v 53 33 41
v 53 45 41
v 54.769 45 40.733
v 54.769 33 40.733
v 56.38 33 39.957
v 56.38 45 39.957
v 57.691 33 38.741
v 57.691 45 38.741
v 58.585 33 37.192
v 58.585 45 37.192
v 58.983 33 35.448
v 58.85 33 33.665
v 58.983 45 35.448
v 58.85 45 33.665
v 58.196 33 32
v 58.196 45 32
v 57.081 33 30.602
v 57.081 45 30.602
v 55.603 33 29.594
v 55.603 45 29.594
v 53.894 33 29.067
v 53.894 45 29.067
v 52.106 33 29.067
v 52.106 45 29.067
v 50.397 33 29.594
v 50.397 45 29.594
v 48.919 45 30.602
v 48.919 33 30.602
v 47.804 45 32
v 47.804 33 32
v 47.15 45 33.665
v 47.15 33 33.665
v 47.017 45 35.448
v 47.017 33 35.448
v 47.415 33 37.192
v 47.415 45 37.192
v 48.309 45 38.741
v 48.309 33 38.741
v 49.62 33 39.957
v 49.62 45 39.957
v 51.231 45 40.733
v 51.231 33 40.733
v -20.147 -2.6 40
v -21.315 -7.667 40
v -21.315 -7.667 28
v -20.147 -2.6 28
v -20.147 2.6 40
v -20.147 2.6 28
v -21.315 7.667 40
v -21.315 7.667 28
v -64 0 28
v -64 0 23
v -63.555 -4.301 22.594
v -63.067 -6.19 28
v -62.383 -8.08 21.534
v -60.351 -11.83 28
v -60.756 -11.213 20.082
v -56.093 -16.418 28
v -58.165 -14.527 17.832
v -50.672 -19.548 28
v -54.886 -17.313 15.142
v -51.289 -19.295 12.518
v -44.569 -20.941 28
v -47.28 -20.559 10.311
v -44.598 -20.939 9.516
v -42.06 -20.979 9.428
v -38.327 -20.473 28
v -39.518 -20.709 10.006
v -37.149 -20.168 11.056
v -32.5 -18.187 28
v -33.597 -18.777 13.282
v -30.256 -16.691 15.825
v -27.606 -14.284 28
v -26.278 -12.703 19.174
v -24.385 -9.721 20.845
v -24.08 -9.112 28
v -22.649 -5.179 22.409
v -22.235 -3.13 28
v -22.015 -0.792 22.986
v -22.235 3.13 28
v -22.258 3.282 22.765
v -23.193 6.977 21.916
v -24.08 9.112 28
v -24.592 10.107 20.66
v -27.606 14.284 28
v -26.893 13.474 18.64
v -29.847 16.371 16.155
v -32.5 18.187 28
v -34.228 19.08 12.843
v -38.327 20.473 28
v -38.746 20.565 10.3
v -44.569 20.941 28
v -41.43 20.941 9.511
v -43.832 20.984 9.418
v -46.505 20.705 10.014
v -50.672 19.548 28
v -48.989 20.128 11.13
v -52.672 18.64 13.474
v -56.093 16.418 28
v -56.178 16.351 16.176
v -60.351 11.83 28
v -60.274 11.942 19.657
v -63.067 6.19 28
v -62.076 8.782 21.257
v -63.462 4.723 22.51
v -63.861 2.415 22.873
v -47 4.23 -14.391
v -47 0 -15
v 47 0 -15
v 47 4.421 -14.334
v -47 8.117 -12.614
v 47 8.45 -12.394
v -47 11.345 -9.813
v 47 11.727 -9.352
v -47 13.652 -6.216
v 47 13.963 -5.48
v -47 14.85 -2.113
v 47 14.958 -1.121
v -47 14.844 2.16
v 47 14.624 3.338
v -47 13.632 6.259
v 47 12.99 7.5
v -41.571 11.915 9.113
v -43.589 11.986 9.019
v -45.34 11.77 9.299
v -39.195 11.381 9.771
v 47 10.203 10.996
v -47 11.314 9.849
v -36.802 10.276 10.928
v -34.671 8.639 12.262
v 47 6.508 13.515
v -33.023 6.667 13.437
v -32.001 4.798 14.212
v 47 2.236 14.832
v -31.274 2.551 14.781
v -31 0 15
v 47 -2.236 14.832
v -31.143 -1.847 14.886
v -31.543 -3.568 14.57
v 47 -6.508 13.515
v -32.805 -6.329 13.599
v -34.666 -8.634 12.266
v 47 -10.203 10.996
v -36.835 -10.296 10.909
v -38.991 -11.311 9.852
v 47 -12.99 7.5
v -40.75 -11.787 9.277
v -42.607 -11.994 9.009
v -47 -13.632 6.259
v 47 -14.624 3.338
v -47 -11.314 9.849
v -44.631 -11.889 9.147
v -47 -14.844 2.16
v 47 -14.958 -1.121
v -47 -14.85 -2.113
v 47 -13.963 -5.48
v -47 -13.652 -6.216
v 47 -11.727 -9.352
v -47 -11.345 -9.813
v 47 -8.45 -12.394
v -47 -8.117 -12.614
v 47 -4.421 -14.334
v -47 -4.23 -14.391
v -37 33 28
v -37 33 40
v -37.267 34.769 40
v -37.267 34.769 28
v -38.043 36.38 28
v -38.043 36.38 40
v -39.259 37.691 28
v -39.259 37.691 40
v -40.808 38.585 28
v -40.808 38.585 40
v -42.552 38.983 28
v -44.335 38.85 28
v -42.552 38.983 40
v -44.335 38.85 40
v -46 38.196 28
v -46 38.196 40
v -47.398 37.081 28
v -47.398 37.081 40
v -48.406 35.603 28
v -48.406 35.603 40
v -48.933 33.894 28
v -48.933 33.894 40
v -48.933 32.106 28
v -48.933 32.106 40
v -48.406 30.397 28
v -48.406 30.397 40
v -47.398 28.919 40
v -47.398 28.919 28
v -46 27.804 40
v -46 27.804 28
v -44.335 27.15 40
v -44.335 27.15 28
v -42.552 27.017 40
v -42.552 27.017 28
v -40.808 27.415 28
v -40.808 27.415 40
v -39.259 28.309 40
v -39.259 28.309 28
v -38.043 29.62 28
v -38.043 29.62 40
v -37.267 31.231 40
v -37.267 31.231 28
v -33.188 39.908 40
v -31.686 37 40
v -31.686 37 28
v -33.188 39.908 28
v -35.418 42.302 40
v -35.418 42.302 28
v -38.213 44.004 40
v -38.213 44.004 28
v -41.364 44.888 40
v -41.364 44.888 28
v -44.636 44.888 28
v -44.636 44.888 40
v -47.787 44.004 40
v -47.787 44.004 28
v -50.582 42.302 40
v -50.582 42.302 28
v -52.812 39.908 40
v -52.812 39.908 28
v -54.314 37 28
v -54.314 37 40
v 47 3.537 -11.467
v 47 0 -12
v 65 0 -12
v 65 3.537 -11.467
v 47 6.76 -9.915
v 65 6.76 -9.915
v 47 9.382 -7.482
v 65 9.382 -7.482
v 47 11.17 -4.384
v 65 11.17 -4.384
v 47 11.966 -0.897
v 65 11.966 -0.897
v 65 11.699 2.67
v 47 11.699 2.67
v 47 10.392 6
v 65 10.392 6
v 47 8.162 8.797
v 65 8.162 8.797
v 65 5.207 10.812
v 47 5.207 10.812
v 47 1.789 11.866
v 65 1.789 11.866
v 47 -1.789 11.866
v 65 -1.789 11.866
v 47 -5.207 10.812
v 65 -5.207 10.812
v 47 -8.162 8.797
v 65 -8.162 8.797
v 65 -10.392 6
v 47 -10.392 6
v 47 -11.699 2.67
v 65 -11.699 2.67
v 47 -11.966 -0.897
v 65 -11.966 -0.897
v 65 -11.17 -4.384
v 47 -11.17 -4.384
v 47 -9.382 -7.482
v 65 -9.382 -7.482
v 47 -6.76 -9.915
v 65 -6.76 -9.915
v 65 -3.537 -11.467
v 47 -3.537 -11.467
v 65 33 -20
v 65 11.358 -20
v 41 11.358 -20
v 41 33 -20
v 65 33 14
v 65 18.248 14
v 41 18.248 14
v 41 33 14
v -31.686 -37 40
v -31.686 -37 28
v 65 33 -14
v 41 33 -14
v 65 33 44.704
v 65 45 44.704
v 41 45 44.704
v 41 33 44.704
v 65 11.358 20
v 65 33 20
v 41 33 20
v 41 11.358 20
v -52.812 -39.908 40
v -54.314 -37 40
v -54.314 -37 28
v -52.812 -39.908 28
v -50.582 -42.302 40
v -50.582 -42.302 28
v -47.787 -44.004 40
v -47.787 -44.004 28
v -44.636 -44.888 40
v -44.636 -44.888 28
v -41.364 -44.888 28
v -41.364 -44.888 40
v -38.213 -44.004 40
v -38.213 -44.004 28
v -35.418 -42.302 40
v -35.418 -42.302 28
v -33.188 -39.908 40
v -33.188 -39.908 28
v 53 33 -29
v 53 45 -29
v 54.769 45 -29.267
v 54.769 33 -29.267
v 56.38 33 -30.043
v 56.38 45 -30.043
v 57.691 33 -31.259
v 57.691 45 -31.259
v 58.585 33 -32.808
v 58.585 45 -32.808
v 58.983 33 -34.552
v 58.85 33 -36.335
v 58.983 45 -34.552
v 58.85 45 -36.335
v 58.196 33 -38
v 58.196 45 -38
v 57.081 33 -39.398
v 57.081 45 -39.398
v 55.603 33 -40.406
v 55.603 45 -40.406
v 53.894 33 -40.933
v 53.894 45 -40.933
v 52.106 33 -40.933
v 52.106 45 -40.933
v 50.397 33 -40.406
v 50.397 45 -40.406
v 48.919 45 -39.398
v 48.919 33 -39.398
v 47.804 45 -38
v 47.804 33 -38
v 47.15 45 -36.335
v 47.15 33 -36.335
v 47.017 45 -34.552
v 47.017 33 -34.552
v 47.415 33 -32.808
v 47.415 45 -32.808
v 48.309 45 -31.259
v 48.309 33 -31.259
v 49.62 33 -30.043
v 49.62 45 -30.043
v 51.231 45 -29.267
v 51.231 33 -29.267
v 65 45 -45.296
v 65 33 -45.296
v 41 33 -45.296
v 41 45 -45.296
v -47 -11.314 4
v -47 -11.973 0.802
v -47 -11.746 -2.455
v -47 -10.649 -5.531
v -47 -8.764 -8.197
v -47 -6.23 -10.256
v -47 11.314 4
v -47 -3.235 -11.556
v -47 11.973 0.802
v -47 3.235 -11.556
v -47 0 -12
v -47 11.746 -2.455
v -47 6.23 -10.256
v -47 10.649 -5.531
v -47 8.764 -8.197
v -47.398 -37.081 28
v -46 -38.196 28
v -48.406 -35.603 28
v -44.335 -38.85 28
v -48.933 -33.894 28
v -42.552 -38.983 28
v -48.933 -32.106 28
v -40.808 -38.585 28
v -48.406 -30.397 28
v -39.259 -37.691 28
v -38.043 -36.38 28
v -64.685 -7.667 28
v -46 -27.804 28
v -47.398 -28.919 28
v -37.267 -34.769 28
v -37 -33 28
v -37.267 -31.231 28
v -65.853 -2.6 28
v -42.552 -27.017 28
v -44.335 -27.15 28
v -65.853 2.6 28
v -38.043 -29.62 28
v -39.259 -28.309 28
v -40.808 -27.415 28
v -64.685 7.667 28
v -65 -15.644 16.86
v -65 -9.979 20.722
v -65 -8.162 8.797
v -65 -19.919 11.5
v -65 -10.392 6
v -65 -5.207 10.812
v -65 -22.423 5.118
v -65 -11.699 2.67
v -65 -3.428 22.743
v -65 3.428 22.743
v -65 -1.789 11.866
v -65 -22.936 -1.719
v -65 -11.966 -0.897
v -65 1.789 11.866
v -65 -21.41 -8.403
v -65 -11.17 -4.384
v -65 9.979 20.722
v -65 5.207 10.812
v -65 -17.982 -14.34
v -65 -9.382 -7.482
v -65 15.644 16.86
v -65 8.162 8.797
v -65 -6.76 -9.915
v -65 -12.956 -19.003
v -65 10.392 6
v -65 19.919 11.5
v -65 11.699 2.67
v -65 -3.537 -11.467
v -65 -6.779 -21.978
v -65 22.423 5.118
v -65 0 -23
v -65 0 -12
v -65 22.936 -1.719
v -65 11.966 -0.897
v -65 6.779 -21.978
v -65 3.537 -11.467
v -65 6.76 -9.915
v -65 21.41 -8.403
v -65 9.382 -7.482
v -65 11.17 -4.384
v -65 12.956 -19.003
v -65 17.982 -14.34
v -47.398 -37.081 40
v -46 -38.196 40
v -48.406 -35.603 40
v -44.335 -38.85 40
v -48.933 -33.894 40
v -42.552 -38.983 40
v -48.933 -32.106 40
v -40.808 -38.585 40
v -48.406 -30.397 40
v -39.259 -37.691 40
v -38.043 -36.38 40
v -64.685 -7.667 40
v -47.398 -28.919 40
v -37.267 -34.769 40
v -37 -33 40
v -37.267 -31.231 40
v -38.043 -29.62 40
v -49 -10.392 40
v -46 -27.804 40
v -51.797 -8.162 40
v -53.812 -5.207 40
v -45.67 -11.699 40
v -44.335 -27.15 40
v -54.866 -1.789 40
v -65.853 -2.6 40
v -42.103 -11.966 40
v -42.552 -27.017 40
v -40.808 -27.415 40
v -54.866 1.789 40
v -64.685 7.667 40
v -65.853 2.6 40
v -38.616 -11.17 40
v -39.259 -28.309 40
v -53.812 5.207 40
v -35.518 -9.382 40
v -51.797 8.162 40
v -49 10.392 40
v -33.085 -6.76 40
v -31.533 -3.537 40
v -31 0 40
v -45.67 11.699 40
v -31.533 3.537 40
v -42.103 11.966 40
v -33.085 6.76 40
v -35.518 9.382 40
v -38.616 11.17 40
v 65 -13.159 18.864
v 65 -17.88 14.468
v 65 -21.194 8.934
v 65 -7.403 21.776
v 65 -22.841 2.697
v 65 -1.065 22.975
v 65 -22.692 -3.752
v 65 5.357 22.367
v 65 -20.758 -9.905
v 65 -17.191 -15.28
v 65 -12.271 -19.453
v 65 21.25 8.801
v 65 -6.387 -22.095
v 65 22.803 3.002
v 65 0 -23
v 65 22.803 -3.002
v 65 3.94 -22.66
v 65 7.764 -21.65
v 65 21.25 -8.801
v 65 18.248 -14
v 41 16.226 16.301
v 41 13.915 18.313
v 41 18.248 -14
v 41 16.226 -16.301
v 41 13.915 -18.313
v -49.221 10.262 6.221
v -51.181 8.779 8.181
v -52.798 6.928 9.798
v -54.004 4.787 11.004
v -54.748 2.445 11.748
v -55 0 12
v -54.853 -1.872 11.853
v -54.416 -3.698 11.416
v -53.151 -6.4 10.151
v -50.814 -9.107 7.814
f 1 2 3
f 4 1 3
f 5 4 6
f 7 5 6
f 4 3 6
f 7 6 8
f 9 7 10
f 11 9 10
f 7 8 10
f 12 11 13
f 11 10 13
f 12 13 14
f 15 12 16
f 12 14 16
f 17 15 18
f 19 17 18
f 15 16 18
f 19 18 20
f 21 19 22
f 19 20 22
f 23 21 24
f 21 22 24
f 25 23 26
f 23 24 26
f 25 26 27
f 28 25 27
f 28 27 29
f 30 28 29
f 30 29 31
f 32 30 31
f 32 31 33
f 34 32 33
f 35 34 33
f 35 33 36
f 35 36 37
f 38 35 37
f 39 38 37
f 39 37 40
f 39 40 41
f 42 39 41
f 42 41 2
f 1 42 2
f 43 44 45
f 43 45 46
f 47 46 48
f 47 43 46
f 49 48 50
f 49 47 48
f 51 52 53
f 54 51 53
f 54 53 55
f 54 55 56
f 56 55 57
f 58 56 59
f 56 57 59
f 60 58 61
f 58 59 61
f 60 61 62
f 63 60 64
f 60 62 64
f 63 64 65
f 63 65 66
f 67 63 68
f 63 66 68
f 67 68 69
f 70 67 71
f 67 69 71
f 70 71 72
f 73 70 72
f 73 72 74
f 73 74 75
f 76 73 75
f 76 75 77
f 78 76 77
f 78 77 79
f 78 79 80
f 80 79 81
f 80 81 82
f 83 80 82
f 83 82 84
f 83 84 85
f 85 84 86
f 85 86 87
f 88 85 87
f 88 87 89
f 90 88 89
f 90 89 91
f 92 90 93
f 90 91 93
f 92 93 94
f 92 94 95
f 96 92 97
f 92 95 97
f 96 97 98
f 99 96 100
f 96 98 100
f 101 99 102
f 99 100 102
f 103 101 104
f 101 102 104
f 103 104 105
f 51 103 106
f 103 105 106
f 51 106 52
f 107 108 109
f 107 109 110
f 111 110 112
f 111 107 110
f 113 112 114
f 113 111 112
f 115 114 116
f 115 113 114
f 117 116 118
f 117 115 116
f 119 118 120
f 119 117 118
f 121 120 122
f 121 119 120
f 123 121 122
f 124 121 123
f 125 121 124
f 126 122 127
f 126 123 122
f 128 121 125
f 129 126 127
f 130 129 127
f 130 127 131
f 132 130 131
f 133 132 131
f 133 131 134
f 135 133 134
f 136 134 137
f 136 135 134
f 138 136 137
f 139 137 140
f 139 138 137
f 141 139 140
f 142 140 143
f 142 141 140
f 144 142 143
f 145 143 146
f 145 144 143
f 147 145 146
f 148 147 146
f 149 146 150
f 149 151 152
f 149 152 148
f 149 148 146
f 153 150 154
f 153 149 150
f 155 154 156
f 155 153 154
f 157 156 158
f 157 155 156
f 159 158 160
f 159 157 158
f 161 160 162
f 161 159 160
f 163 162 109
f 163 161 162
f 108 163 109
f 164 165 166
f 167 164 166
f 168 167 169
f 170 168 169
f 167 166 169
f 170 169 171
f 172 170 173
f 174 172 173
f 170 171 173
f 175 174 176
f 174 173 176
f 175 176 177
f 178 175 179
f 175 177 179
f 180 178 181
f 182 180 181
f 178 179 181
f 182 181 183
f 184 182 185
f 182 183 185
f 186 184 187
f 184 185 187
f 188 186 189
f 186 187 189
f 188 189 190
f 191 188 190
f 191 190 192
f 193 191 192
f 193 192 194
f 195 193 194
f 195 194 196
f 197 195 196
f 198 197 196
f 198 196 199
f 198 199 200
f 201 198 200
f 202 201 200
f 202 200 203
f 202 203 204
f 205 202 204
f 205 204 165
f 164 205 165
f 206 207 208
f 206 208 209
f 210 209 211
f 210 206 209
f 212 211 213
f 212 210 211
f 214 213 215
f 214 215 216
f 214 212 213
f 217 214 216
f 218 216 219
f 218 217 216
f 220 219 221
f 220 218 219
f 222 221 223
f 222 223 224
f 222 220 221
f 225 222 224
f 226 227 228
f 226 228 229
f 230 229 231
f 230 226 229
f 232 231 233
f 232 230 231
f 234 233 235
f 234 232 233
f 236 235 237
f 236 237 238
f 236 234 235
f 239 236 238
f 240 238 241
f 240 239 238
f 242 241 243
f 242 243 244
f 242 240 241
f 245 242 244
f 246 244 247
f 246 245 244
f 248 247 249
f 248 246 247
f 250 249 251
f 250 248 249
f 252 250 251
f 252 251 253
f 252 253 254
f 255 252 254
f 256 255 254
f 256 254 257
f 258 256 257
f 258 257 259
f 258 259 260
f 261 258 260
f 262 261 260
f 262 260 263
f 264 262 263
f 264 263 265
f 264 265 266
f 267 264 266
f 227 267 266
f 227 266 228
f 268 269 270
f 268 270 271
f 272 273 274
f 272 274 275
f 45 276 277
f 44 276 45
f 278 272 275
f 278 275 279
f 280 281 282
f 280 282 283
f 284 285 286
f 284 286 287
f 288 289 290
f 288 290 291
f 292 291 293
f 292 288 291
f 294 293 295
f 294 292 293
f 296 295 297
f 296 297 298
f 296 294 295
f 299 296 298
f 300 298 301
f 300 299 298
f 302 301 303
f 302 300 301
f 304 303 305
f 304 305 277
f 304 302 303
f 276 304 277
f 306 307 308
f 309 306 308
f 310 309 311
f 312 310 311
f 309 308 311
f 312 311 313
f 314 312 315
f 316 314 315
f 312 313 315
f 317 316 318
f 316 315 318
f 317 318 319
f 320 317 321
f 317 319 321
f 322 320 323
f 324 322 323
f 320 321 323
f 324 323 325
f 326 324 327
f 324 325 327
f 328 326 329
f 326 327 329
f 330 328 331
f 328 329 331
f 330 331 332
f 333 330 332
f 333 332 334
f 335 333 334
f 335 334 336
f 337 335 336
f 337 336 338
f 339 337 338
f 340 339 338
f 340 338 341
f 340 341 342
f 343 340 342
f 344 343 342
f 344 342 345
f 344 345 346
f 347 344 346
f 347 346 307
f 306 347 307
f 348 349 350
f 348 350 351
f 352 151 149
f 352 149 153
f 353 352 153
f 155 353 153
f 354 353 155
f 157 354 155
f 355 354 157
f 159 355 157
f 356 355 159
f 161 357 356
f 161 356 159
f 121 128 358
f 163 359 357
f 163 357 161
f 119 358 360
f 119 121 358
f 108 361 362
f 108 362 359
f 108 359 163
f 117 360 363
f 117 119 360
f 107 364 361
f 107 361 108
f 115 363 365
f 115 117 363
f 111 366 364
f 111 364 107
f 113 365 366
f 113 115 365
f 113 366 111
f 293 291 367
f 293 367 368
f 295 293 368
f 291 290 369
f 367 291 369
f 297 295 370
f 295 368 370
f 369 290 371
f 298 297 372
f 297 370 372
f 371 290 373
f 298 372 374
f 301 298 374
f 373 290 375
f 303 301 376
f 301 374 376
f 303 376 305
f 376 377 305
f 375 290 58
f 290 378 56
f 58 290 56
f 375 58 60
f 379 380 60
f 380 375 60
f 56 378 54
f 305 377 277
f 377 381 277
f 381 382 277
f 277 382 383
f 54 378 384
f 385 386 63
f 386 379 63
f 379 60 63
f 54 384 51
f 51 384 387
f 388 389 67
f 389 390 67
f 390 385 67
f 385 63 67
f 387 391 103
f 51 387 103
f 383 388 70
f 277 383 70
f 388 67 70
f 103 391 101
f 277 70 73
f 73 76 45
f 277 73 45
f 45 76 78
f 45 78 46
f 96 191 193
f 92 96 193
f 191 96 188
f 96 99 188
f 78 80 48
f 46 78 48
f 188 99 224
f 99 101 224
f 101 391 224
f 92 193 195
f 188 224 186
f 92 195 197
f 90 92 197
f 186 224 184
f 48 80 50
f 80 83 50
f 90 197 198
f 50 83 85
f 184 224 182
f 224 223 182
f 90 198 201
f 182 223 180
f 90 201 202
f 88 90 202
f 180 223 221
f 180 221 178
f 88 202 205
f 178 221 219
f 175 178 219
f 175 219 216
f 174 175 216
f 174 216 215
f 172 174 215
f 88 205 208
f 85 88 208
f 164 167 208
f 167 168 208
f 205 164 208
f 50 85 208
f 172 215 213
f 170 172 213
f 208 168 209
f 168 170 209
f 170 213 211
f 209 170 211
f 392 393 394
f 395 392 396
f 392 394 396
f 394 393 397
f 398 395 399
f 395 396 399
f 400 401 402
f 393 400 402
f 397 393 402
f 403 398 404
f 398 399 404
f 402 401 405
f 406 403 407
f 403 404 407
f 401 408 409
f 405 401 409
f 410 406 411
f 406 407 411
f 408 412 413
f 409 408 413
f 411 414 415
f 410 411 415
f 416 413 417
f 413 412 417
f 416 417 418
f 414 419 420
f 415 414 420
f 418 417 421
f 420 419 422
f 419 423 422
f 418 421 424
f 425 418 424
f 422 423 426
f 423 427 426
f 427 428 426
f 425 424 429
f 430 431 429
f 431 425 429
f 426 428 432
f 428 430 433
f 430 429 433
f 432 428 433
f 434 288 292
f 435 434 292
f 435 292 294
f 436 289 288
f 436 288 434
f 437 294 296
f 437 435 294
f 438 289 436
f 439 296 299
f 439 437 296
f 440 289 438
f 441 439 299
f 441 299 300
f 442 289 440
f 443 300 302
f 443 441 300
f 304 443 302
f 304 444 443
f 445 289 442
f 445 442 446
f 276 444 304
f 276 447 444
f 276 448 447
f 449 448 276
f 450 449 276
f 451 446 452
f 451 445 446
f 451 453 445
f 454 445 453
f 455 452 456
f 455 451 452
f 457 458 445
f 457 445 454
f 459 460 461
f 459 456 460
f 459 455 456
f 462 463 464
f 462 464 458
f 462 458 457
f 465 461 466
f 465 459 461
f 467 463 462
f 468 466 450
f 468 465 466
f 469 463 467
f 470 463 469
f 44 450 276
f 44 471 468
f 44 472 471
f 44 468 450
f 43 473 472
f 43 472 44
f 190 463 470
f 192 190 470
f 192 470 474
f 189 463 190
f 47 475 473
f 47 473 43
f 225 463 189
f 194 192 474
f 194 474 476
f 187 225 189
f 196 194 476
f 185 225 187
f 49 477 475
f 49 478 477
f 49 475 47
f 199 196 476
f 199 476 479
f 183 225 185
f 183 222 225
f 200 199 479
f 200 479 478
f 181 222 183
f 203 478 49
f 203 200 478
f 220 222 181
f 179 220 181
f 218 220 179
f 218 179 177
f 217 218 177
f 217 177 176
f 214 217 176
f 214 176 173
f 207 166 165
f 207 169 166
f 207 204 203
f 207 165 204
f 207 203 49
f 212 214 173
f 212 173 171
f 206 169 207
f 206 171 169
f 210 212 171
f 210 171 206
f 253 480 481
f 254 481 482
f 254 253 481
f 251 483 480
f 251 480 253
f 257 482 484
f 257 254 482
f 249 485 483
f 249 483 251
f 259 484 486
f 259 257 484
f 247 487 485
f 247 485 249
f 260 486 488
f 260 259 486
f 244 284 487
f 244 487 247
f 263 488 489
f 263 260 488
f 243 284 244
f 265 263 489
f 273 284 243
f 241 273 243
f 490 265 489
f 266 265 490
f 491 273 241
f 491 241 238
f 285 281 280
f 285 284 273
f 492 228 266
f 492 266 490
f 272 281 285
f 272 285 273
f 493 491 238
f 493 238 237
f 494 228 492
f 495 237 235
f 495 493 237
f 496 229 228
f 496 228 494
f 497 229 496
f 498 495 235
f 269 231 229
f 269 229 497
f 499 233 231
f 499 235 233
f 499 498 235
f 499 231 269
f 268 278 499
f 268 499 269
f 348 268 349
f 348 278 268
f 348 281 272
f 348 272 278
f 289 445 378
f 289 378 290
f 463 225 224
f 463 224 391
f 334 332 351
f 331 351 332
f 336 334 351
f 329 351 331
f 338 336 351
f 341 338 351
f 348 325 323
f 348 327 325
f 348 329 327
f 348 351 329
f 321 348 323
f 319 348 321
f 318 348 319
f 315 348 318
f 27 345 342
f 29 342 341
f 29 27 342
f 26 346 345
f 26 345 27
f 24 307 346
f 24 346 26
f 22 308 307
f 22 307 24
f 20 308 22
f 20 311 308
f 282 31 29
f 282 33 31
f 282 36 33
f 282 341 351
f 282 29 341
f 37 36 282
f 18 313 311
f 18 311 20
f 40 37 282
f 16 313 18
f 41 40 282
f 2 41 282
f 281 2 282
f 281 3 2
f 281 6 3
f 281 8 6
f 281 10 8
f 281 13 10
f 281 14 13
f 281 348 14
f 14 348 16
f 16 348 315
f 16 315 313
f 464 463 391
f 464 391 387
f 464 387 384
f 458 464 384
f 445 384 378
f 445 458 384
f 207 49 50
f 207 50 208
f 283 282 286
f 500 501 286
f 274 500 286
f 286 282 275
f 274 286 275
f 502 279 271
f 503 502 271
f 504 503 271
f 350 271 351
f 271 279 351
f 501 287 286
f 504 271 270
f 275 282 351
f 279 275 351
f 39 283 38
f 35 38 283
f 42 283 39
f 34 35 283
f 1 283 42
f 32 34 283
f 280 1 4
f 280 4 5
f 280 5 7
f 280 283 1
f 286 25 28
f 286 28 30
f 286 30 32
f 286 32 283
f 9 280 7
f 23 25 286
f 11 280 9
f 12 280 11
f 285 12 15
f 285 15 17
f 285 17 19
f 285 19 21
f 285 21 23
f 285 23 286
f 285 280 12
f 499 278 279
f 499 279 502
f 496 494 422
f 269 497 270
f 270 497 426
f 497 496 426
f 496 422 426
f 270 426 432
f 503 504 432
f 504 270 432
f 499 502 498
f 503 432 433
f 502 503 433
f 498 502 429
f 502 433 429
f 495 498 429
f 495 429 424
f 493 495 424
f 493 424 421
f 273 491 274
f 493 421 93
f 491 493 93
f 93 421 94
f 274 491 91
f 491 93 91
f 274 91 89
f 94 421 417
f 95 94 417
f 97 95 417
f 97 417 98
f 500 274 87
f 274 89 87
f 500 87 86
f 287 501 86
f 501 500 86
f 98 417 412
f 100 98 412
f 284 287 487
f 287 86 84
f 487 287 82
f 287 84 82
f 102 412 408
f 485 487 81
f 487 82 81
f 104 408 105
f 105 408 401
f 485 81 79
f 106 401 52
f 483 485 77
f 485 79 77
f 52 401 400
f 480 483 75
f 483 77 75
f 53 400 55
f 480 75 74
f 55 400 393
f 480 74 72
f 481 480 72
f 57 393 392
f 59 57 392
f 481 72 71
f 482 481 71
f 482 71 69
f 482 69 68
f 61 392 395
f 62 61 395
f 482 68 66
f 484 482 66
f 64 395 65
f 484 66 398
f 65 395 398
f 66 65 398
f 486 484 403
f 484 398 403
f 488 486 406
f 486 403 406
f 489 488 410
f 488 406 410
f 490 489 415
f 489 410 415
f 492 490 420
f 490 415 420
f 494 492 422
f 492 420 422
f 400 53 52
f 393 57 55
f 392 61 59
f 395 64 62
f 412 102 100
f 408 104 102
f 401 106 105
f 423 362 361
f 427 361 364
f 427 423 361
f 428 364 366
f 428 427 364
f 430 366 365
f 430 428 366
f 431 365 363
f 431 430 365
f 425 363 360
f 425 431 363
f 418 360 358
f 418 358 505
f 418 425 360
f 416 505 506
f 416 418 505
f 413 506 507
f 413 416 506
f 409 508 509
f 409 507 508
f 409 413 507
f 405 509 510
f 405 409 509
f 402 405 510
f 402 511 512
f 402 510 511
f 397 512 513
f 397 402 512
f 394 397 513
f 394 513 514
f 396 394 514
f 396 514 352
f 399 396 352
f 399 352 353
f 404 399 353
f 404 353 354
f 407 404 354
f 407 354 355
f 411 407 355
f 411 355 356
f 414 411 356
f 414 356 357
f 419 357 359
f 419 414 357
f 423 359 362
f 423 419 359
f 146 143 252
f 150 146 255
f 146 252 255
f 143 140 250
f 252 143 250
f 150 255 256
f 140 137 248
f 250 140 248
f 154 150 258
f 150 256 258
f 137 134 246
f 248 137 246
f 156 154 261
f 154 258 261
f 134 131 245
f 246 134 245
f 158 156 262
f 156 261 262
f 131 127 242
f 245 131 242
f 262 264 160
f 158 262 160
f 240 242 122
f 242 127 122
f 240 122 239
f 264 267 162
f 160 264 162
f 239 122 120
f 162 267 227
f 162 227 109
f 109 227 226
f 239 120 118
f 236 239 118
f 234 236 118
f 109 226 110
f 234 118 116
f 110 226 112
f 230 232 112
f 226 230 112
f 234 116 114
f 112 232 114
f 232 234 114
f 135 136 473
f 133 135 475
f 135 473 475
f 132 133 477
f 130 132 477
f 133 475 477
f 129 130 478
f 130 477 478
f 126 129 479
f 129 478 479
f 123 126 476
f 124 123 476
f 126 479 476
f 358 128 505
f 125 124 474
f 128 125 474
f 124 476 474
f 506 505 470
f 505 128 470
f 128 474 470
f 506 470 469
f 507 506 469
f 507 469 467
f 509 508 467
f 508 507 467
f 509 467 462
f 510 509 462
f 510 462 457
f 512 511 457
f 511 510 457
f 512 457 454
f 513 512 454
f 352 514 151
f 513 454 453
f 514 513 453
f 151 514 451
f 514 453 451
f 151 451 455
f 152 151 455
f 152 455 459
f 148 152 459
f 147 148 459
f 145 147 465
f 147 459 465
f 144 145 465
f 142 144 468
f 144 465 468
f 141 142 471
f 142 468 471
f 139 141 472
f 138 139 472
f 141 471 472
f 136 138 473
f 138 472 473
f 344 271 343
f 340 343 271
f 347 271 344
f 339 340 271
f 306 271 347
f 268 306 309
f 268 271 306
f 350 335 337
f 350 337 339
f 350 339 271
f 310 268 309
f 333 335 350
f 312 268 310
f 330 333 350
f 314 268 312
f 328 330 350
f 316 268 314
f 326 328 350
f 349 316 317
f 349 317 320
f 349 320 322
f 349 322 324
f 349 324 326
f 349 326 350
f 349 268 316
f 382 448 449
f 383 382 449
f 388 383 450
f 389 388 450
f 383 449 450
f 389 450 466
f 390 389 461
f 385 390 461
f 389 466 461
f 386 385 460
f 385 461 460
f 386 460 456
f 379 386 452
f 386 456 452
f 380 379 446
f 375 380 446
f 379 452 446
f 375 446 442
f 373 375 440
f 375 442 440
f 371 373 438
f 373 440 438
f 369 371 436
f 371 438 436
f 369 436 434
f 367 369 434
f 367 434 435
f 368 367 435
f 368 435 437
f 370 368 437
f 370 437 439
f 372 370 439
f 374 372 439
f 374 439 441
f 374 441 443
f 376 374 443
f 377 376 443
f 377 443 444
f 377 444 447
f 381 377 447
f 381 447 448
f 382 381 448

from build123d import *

# Parameters (mm, degrees)
EXTRUDE_1_DEPTH          = 65
EXTRUDE_1_DEPTH_BACK     = 65
SKETCH_1_R               = 23
EXTRUDE_3_DEPTH          = 24
SKETCH_7_R               = 6
CUT_EXTRUDE_3_DEPTH      = 24
SKETCH_8_R               = 21
EXTRUDE_4_DEPTH          = 40
CUT_EXTRUDE_2_DEPTH      = 65
CUT_EXTRUDE_2_DEPTH_BACK = 65
SKETCH_3_R               = 12
CUT_EXTRUDE_1_DEPTH      = 47
CUT_EXTRUDE_1_DEPTH_BACK = 47
SKETCH_2_R               = 15
EXTRUDE_5_DEPTH          = 12
SKETCH_11_R              = 12
SKETCH_11_R_2            = 6
CUT_EXTRUDE_4_DEPTH      = 40


with BuildPart() as part:
    # 草图1 → 凸台-拉伸1 (new, two sides: drawn at the far end of the back side and taken through both)
    with BuildSketch(Plane(origin=(0, 0, 0), x_dir=(0, 0, -1), z_dir=(1, 0, 0)).offset(-EXTRUDE_1_DEPTH_BACK)):
        Circle(SKETCH_1_R)
    extrude(amount=EXTRUDE_1_DEPTH + EXTRUDE_1_DEPTH_BACK)

    # 草图4 → 凸台-拉伸3 (add)
    with BuildSketch(Plane(origin=(65, 0, 0), x_dir=(0, 0, -1), z_dir=(1, 0, 0))):
        Polygon((-20, 33), (-20, 11.357816692), (-14, 18.248287591), (-14, 33), (14, 33), (14, 18.248287591), (20, 11.357816692), (20, 33), (45.296363349, 33), (45.296363349, 45), (-44.703636651, 45), (-44.703636651, 33), align=None)
    extrude(amount=-EXTRUDE_3_DEPTH)

    # 草图7 → 切除-拉伸3 (cut)
    with BuildSketch(Plane(origin=(0, 45, 0), x_dir=(1, 0, 0), z_dir=(0, 1, 0))):
        with Locations((53, 35)):
            Circle(SKETCH_7_R)
        with Locations((53, -35)):
            Circle(SKETCH_7_R)
    extrude(amount=-CUT_EXTRUDE_3_DEPTH, mode=Mode.SUBTRACT)

    # 草图8 → 凸台-拉伸4 (add)
    with BuildSketch(Plane.XY):
        with Locations((-43, 0)):
            Circle(SKETCH_8_R)
    extrude(amount=EXTRUDE_4_DEPTH)

    # 草图3 → 切除-拉伸2 (cut, two sides: drawn at the far end of the back side and taken through both)
    with BuildSketch(Plane(origin=(0, 0, 0), x_dir=(0, 0, -1), z_dir=(1, 0, 0)).offset(-CUT_EXTRUDE_2_DEPTH_BACK)):
        Circle(SKETCH_3_R)
    extrude(amount=CUT_EXTRUDE_2_DEPTH + CUT_EXTRUDE_2_DEPTH_BACK, mode=Mode.SUBTRACT)

    # 草图2 → 切除-拉伸1 (cut, two sides: drawn at the far end of the back side and taken through both)
    with BuildSketch(Plane(origin=(0, 0, 0), x_dir=(0, 0, -1), z_dir=(1, 0, 0)).offset(-CUT_EXTRUDE_1_DEPTH_BACK)):
        Circle(SKETCH_2_R)
    extrude(amount=CUT_EXTRUDE_1_DEPTH + CUT_EXTRUDE_1_DEPTH_BACK, mode=Mode.SUBTRACT)

    # 草图10 → 凸台-拉伸5 (add)
    with BuildSketch(Plane.XY.offset(40)):
        with BuildLine():
            Line((-54.313708499, 37), (-64.684607956, 7.666666667))
            ThreePointArc((-64.684607956, 7.666666667), (-66, 0), (-64.684607956, -7.666666667))
            Line((-64.684607956, -7.666666667), (-54.313708499, -37))
            ThreePointArc((-54.313708499, -37), (-43, -45), (-31.686291501, -37))
            Line((-31.686291501, -37), (-21.315392044, -7.666666667))
            ThreePointArc((-21.315392044, -7.666666667), (-20, 0), (-21.315392044, 7.666666667))
            Line((-21.315392044, 7.666666667), (-31.686291501, 37))
            ThreePointArc((-31.686291501, 37), (-43, 45), (-54.313708499, 37))
        make_face()
    extrude(amount=-EXTRUDE_5_DEPTH)

    # 草图11 → 切除-拉伸4 (cut)
    with BuildSketch(Plane.XY.offset(40)):
        with Locations((-43, 0)):
            Circle(SKETCH_11_R)
        with Locations((-43, 33)):
            Circle(SKETCH_11_R_2)
        with Locations((-43, -33)):
            Circle(SKETCH_11_R_2)
    extrude(amount=-CUT_EXTRUDE_4_DEPTH, mode=Mode.SUBTRACT)


solid = part.part
